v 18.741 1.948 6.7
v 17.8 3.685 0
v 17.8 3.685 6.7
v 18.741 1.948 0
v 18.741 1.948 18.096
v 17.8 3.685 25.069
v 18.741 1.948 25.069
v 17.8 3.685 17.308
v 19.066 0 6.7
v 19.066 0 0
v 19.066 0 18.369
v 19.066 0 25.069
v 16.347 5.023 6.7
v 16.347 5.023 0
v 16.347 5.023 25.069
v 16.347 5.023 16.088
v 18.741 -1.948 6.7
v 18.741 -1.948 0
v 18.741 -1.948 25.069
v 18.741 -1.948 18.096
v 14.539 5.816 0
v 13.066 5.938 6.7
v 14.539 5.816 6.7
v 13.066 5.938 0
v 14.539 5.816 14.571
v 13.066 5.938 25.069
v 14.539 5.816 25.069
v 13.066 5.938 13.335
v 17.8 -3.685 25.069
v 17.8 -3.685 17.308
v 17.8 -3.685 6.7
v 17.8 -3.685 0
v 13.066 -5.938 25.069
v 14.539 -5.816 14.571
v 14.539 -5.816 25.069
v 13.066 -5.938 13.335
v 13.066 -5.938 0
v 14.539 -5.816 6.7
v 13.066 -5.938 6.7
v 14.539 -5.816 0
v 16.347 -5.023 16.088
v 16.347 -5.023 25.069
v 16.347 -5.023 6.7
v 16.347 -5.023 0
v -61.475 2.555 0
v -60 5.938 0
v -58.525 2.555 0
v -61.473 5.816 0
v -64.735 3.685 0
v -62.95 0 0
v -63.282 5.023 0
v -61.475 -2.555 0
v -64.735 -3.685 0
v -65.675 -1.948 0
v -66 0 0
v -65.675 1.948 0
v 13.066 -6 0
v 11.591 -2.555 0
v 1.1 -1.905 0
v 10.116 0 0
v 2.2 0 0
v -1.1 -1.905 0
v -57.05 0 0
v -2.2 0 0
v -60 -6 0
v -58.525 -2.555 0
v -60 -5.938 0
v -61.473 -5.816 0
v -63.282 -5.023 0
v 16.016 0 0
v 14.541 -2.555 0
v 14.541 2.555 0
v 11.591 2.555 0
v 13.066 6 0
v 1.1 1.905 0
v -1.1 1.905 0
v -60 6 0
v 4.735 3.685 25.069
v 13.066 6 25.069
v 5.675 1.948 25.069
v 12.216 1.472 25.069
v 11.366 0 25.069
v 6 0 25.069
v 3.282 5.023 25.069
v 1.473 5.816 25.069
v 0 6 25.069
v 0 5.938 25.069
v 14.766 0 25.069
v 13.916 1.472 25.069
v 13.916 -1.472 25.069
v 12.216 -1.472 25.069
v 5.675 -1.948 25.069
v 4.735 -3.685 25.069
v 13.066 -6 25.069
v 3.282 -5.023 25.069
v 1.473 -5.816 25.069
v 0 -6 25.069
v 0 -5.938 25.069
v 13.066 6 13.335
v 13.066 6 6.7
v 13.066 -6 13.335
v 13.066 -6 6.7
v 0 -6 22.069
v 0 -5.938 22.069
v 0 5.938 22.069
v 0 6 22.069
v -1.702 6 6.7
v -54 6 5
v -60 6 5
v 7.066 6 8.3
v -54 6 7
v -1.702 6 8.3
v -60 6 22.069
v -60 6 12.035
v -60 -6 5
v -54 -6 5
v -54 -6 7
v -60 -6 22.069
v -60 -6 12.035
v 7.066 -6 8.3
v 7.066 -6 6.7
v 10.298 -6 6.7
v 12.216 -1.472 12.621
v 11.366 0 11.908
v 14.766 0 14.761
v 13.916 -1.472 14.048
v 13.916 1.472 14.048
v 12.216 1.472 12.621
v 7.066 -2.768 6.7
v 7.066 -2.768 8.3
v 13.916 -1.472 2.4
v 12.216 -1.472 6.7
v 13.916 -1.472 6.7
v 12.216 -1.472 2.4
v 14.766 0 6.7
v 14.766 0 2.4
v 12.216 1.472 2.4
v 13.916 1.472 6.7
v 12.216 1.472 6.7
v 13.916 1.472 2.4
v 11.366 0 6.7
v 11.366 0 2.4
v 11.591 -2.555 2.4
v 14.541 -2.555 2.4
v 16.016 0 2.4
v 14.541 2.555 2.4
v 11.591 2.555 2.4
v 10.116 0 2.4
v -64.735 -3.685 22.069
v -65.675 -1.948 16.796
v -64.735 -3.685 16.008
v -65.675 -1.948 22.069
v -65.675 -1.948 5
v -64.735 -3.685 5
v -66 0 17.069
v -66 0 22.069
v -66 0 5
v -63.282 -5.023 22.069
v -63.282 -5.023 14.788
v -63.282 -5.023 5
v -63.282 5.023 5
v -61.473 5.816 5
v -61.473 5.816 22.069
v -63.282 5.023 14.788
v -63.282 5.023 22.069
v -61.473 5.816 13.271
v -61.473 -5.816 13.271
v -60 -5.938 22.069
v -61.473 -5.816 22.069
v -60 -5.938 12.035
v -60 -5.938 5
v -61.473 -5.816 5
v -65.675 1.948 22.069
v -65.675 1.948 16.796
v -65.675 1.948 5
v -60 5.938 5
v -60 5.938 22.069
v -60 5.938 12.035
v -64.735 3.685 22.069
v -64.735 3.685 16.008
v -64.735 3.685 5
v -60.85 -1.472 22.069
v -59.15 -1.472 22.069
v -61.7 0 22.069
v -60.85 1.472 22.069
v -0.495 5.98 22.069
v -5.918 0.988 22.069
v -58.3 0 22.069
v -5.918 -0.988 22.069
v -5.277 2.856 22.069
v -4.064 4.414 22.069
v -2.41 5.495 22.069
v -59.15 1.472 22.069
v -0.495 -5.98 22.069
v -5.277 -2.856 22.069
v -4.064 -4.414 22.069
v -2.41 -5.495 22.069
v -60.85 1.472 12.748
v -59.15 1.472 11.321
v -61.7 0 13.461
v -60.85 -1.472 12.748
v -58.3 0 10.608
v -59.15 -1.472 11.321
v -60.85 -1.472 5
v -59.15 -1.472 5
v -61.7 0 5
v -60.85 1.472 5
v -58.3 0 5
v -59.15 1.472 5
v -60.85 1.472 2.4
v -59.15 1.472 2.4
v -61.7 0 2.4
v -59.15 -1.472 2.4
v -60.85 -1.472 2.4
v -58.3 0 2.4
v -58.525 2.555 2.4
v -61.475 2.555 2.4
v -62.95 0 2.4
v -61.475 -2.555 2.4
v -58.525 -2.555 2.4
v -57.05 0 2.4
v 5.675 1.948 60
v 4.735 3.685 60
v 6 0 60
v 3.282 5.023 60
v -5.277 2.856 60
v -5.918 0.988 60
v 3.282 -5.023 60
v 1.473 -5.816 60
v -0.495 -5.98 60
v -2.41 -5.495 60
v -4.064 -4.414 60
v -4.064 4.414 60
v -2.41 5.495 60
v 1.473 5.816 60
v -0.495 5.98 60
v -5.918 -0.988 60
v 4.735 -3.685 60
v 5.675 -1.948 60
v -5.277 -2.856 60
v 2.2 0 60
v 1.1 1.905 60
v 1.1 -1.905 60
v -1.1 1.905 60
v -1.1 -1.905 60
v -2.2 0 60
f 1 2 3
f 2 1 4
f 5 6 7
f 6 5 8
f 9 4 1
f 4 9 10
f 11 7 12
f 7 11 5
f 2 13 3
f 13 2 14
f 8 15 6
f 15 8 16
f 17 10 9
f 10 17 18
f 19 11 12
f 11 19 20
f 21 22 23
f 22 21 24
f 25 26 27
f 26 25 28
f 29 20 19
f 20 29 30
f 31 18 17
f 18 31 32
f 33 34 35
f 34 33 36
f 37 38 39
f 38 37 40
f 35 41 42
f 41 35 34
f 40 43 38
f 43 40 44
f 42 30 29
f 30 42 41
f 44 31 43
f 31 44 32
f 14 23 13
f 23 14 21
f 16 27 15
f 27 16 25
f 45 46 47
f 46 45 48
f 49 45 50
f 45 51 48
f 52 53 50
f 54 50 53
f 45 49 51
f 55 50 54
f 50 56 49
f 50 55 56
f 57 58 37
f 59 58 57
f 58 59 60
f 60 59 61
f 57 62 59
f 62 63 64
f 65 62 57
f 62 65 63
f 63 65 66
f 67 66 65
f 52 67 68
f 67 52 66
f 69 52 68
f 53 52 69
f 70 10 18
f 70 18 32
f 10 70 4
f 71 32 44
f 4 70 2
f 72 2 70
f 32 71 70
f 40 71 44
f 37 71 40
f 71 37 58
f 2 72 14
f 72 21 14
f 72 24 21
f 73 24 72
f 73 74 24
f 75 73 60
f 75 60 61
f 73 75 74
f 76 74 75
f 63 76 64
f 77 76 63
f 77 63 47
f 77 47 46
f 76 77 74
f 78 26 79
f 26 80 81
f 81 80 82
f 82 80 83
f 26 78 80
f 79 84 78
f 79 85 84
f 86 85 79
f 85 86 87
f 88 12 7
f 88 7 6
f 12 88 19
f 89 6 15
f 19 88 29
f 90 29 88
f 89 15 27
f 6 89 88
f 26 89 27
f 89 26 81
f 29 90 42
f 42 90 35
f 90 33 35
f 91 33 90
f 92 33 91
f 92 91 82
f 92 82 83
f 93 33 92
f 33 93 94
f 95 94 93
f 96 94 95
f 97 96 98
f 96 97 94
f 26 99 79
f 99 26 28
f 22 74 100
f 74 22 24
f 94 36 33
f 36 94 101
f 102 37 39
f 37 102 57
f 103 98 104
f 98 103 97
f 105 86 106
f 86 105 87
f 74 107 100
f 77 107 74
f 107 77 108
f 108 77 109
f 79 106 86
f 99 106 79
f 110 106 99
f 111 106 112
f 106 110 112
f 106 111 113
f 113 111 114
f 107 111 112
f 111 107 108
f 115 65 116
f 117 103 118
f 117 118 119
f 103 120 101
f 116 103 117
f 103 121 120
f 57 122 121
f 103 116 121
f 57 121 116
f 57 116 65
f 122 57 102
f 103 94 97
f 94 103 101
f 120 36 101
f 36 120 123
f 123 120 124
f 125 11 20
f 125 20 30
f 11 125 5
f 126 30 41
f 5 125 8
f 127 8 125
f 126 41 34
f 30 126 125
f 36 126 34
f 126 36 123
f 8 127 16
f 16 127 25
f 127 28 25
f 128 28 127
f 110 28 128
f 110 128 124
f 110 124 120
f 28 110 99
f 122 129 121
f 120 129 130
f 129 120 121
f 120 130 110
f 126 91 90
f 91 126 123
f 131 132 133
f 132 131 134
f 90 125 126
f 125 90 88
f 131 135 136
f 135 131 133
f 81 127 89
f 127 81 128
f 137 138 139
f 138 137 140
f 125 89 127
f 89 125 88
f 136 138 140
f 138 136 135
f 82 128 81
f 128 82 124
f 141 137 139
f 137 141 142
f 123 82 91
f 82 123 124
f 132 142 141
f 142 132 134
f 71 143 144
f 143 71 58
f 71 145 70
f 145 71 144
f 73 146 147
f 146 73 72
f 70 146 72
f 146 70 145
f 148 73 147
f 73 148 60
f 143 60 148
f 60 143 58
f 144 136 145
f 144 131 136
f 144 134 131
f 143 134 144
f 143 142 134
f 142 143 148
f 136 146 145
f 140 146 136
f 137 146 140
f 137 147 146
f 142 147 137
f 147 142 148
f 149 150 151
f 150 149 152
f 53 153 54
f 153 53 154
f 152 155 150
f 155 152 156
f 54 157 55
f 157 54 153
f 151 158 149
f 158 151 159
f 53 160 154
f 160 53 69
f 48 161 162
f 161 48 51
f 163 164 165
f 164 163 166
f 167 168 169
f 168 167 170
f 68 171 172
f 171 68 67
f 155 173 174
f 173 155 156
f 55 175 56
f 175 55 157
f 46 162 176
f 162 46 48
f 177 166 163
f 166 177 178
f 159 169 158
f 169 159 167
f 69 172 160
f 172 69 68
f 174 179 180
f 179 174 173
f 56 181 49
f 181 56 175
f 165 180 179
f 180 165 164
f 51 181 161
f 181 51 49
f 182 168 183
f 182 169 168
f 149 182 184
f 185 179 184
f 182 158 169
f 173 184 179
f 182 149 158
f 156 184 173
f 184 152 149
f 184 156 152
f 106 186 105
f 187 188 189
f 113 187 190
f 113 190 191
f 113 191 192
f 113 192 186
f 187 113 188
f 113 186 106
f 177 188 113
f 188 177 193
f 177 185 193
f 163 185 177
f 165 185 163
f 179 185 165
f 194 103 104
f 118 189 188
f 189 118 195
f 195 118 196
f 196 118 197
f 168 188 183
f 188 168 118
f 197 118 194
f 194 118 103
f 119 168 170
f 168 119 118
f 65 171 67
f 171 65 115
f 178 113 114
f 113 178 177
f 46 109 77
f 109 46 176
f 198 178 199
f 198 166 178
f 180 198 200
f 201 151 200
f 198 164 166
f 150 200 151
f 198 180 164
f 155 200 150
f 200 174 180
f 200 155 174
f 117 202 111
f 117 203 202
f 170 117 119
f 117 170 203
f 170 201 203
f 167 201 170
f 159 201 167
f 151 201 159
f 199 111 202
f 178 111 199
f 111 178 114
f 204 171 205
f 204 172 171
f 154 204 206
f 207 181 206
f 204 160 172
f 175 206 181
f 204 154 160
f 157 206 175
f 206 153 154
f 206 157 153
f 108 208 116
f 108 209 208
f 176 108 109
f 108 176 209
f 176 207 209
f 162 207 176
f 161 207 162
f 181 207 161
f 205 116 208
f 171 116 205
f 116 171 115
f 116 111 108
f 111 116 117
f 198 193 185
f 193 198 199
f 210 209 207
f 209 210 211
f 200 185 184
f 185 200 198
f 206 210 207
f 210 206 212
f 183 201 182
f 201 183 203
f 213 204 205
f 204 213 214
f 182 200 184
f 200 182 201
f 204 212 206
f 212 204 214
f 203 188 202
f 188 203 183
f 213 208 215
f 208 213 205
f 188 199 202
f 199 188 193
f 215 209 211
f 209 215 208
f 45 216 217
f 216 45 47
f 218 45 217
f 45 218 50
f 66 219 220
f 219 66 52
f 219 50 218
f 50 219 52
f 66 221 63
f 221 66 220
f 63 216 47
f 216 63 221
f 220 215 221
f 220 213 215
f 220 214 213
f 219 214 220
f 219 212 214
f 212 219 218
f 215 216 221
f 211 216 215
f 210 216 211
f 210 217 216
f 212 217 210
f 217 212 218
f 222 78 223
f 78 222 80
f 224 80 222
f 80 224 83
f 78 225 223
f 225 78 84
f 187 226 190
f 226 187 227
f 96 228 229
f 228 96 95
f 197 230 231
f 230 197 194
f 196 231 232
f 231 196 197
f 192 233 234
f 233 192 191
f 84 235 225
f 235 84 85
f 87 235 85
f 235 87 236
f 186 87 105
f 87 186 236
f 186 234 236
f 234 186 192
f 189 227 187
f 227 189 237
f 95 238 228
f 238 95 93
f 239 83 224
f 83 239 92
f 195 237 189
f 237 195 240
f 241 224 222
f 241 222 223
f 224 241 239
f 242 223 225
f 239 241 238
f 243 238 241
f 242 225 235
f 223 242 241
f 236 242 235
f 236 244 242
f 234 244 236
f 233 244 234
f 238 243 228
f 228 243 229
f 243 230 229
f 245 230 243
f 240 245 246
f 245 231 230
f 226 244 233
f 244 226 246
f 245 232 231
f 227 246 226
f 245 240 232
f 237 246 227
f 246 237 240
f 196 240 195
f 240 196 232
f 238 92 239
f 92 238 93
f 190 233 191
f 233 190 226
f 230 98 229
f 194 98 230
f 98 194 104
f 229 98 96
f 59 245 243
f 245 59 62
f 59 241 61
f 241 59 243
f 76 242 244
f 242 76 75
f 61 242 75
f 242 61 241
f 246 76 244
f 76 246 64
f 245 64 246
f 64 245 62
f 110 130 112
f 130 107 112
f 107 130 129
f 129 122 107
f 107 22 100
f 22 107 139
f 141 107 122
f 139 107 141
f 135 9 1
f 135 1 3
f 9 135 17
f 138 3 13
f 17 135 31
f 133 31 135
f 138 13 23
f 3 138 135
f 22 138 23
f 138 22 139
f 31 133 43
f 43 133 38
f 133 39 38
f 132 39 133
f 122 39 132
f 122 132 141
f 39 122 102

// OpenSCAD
// file: flipper_solenoid.scad
include <physical_dimensions.scad>

module flipper_solenoid(expansion = 0) {
	difference() {
		union() {
			translate([-flipper_solenoid_width / 2, flipper_solenoid_pin_retracted - flipper_solenoid_pinhole_position]) {
				cube([flipper_solenoid_width, flipper_solenoid_length, flipper_solenoid_height]);
			}
			translate([0, flipper_solenoid_pin_retracted - flipper_solenoid_pinhole_position, flipper_solenoid_height / 2]) {
				rotate([90, 0, 0]) {
					cylinder(r=flipper_solenoid_pin_radius, h=flipper_solenoid_pin_retracted + expansion);
				}
			}
		}
		translate([0, -expansion, 0]) { //Pin hole.
			cylinder(r=flipper_solenoid_pinhole_radius, h=flipper_solenoid_height);
		}
		translate([-flipper_solenoid_pin_radius, -flipper_solenoid_pinhole_position - expansion, flipper_solenoid_height / 2 - flipper_solenoid_pingap_thickness / 2]) {
			cube([flipper_solenoid_pin_radius * 2, flipper_solenoid_pingap_depth, flipper_solenoid_pingap_thickness]);
		}
		translate([0, flipper_solenoid_pin_retracted - flipper_solenoid_pinhole_position + flipper_solenoid_screw1_position, 0]) {
			cylinder(r=flipper_solenoid_screw_radius, h=flipper_solenoid_screw_depth);
		}
		translate([0, flipper_solenoid_pin_retracted - flipper_solenoid_pinhole_position + flipper_solenoid_screw2_position, 0]) {
			cylinder(r=flipper_solenoid_screw_radius, h=flipper_solenoid_screw_depth);
		}
	}
}

flipper_solenoid($t * 10);
// file: physical_dimensions.scad
//Physically bound settings.
printing_play = 0.2; //Horizontal error in 3D printing.
printing_overhang = 50; //Maximum overhang angle. 90 is perfect bridging. 0 is no overhang possible.

movement_play = 0.2; //Play to leave if stuff has to move past each other.

hexkey_radius = 2; //Radius of circumscribed circle around hex key.
hexkey_short_length = 30; //Length of short end.//TODO: How long is this?

ball_radius = 15; //Standard pinball size (7/6 inch).

m3_bolt_radius = 1.5;
m3_nut_radius = 5.5 / 2;
m3_nut_height = 2.4;

flipper_solenoid_width = 13;
flipper_solenoid_height = 15;
flipper_solenoid_length = 30;
flipper_solenoid_pin_radius = 2;
flipper_solenoid_pin_retracted = 8.5; //Length when retracted.
flipper_solenoid_pin_expansion = 10; //Additional length when expanded.
flipper_solenoid_pinhole_position = 2.5; //Distance from centre of hole to tip of pin.
flipper_solenoid_pinhole_radius = m3_bolt_radius;
flipper_solenoid_pingap_thickness = 1.6;
flipper_solenoid_pingap_depth = 7;
flipper_solenoid_screw_radius = m3_bolt_radius;
flipper_solenoid_screw1_position = 8; //Distance from front.
flipper_solenoid_screw2_position = 15 + flipper_solenoid_screw1_position;
flipper_solenoid_screw_depth = 4; //Unknown.

spring_end_thickness = 2; //How thick the attachment part of the spring is.
spring_radius = 4; //Radius of the coil of the spring.
// main file
include <physical_dimensions.scad>;
use <flipper_solenoid.scad>;

//Preference settings.
grip_length = 60;
radius = flipper_solenoid_pin_retracted - flipper_solenoid_pinhole_position;
flipper_rotation_angle = 45; //Degrees rotation when activated.
spring_arm = 60; //How far the spring must be from the centre of rotation.
spring_min_thickness = 5; //How thick to make the handles above and below the spring.

//Calculations.
solenoid_arm = flipper_solenoid_pin_expansion / 2 / sin(flipper_rotation_angle / 2);
around_pin = flipper_solenoid_height / 2 - flipper_solenoid_pin_radius;

if(version_num() >= 20181007) { //Assertions was merged on 2018-10-7.
	assert(m3_nut_height < around_pin); //Otherwise there is no space to adhere nut.
	assert(radius <= flipper_solenoid_pin_retracted - flipper_solenoid_pinhole_position); //Otherwise the solenoid intersects with the side of the grip.
}

module attachment(arm, min_thickness, spacing) {
	difference() {
		arm_height = min_thickness * 2 + spacing + tan(90 - printing_overhang) * radius * 2;
		union() { //Body of arm.
			translate([arm, 0, 0]) {
				cylinder(r=radius, h=arm_height);
			}
			translate([0, -radius, 0]) {
				cube([arm, radius * 2, arm_height]);
			}
		}
		translate([arm - radius, -radius, min_thickness]) { //Gap to fit the attachment.
			cube([radius * 2, radius * 2, spacing]);
			diagonal = radius * 2 / cos(printing_overhang);
			intersection() { //Making this end printable.
				translate([0, 0, spacing]) {
					rotate([0, printing_overhang, 0]) {
						cube([radius * 2 / cos(printing_overhang), radius * 2, arm_height]);
					}
				}
				cube([radius * 2, radius * 2, arm_height]);
			}
		}
		cylinder($fn=6, r=hexkey_radius + printing_play, h=arm_height); //Overlap with main hex key.
		translate([arm, 0, 0]) {
			cylinder(r=m3_bolt_radius + printing_play, h=arm_height); //Putting a bolt here to attach it.
			cylinder($fn=6, r=m3_nut_radius + printing_play, h=m3_nut_height); //Leave space for nut.
		}
	}
}

module flipper_grip() {
	solenoid_min_thickness = flipper_solenoid_height / 2 - flipper_solenoid_pingap_thickness / 2;
	difference() {
		union() {
			cylinder(r=radius, h=grip_length); //Main body.
			attachment(solenoid_arm, solenoid_min_thickness, flipper_solenoid_pingap_thickness);
			rotate([0, 0, 180]) {
				attachment(spring_arm, spring_min_thickness, spring_end_thickness);
			}
		}
		cylinder($fn=6, r=hexkey_radius + printing_play, h=grip_length); //Slot for hex key.
		translate([solenoid_arm, 0, solenoid_min_thickness]) {
			rotate([0, 0, flipper_rotation_angle]) {
				translate([-radius - printing_play, -radius - printing_play, 0]) {
					cube([(radius + printing_play) * 2, 9999999999999, flipper_solenoid_pingap_thickness]);
				}
			}
		}
	}
}

//Debug.
flipper_grip();
